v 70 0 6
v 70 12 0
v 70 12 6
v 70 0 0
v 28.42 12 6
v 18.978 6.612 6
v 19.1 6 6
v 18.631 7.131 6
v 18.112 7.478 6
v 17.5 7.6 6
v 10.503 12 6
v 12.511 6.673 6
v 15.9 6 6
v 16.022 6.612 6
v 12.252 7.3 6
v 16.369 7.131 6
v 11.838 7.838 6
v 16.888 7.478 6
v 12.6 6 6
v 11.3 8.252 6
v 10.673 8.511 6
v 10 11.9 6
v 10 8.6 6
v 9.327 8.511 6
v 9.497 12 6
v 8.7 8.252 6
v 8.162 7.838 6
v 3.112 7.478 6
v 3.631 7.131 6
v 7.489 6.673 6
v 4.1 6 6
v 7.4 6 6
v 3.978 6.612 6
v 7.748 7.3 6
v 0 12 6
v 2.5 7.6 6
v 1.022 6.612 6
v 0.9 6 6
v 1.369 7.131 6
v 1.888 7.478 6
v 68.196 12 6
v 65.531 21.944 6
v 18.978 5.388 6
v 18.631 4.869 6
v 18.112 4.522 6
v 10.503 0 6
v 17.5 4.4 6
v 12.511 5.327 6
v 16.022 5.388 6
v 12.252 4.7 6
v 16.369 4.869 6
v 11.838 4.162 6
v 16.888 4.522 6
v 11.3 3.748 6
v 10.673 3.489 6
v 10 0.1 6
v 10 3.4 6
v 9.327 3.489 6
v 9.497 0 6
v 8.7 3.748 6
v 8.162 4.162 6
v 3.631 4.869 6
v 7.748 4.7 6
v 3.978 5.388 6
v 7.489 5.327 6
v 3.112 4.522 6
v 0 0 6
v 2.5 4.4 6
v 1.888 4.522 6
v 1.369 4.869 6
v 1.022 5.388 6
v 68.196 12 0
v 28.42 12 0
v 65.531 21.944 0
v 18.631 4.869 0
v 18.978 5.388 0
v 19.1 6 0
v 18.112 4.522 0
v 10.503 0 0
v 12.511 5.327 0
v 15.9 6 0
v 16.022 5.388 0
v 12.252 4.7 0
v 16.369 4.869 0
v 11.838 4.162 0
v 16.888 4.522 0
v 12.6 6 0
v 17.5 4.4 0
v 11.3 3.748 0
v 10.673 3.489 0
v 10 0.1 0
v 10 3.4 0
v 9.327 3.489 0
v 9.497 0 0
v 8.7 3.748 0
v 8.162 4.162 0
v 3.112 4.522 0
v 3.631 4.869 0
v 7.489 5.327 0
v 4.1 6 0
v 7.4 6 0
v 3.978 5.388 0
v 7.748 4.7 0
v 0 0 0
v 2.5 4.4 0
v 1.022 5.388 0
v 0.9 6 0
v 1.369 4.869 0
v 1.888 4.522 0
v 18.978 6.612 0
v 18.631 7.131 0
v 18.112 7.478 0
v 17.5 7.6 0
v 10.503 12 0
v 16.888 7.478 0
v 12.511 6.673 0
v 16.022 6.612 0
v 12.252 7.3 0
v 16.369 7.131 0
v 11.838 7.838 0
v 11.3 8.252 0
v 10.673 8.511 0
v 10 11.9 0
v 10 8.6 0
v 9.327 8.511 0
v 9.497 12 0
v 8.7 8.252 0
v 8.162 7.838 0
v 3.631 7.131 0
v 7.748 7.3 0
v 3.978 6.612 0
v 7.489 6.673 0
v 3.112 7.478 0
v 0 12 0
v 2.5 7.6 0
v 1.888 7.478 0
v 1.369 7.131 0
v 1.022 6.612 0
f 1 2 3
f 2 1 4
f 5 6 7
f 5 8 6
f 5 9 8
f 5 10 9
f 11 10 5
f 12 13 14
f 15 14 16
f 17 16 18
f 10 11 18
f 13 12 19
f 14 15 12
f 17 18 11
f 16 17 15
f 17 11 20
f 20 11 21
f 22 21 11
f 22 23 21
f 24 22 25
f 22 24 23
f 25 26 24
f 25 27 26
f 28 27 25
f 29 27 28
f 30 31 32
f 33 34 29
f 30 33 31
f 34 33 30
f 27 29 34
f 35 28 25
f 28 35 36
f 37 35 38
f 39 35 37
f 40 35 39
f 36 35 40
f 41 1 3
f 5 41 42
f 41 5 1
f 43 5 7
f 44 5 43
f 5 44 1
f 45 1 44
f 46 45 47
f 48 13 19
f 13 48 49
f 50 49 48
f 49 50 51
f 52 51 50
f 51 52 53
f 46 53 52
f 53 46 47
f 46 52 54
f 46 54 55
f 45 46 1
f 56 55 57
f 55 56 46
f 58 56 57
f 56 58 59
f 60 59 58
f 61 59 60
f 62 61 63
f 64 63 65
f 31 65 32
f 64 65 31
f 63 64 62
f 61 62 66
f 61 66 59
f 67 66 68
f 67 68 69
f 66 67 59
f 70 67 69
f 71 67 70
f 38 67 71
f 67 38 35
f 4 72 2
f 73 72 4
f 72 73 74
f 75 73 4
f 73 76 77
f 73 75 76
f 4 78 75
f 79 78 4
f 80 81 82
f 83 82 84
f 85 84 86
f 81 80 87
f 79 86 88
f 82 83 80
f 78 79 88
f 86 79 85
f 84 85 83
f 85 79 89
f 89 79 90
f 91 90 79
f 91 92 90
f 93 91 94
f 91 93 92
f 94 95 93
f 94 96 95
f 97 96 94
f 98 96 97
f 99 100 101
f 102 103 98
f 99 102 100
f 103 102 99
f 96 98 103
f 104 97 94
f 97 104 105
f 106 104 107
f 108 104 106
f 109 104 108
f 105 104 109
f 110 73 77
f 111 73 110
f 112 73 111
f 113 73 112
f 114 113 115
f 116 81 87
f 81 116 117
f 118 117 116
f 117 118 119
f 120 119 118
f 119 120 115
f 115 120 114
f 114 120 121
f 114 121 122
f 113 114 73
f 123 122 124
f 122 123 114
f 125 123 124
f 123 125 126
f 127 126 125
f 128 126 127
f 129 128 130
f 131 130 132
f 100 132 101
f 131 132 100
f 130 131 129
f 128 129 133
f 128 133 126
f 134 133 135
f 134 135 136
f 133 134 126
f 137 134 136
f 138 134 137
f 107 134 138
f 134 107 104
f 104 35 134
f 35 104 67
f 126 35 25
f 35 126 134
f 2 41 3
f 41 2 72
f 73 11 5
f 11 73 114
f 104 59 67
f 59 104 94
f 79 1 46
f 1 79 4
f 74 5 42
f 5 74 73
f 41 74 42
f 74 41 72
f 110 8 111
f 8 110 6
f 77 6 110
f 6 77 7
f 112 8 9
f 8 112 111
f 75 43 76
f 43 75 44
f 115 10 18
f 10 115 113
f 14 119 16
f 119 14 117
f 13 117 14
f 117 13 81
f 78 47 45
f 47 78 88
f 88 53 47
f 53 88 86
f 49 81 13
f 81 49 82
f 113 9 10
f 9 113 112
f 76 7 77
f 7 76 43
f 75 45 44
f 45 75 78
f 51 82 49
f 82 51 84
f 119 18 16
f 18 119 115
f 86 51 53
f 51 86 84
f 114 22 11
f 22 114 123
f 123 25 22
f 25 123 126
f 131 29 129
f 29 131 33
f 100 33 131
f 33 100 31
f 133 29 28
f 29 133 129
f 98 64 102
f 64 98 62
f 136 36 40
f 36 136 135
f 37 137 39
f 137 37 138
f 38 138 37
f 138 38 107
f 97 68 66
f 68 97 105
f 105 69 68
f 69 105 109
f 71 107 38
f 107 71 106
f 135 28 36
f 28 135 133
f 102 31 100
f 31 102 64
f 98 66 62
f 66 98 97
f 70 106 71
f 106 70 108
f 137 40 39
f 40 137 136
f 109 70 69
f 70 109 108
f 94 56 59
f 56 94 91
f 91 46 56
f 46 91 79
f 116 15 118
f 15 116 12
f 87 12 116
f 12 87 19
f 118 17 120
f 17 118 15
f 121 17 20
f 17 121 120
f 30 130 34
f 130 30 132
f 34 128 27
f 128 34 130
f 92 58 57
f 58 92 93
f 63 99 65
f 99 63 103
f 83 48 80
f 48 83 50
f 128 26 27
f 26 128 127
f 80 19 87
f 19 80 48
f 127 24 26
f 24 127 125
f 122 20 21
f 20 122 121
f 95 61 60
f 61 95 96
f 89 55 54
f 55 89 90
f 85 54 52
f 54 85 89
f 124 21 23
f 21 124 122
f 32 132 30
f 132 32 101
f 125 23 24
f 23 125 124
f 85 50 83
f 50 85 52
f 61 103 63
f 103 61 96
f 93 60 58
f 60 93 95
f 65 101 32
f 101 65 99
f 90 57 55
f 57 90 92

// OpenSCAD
// =============================================
// Riftbound Card Sorter — Sort Gate Lever
// =============================================
// Print 2× — one per sort-gate servo driven by hardware/servos.py:
//   PCA9685 ch1 — deflect gate: floor select
//                 (GATE_LEFT → lower floor bins 0-3, GATE_RIGHT → upper
//                  floor bins 4-7, GATE_CENTER → reject bin 9)
//   PCA9685 ch2 — bin select: column 0-3 (BIN_SELECT_ANGLES), reject 160°
// (ch0 is the suction pickup arm, not a gate; ch3-15 unused.)
// The 2-floor × 4-column tray needs exactly these two: floor + column.
// Servo horn drives the lever to route cards left/right
// Material: PETG (flex-resistant), 0.2mm, 60% infill
// =============================================

lever_len    = 70;
lever_w      = 12;
lever_thick  = 6;
pivot_x      = 10;
pivot_dia    = 5.2;

// Servo horn (25T standard)
horn_pcd     = 15;
horn_hole_d  = 3.2;
horn_ctr_d   = 5.2;

// Paddle at tip (deflects cards)
paddle_l     = 40;
paddle_angle = 15;  // degrees, angled to guide card smoothly

module gate_lever() {
    difference() {
        union() {
            // Main lever body
            cube([lever_len, lever_w, lever_thick]);

            // Paddle (angled deflector at tip)
            translate([lever_len - paddle_l, 0, 0])
                rotate([0, 0, paddle_angle])
                cube([paddle_l, lever_w, lever_thick]);
        }

        // Pivot hole
        translate([pivot_x, lever_w / 2, -0.1])
            cylinder(d = pivot_dia, h = lever_thick + 0.2, $fn = 24);

        // Servo horn center + 4× M3 holes
        translate([pivot_x, lever_w / 2, -0.1])
            cylinder(d = horn_ctr_d, h = lever_thick + 0.2, $fn = 24);

        for (a = [0, 90, 180, 270])
            translate([
                pivot_x + cos(a) * horn_pcd / 2,
                lever_w / 2 + sin(a) * horn_pcd / 2,
                -0.1
            ])
                cylinder(d = horn_hole_d, h = lever_thick + 0.2, $fn = 16);
    }
}

gate_lever();

// =============================================
// PRINT ORIENTATION: flat face down
// SUPPORTS: none needed
// PRINT 2× (mirror in slicer for second lever)
// =============================================
